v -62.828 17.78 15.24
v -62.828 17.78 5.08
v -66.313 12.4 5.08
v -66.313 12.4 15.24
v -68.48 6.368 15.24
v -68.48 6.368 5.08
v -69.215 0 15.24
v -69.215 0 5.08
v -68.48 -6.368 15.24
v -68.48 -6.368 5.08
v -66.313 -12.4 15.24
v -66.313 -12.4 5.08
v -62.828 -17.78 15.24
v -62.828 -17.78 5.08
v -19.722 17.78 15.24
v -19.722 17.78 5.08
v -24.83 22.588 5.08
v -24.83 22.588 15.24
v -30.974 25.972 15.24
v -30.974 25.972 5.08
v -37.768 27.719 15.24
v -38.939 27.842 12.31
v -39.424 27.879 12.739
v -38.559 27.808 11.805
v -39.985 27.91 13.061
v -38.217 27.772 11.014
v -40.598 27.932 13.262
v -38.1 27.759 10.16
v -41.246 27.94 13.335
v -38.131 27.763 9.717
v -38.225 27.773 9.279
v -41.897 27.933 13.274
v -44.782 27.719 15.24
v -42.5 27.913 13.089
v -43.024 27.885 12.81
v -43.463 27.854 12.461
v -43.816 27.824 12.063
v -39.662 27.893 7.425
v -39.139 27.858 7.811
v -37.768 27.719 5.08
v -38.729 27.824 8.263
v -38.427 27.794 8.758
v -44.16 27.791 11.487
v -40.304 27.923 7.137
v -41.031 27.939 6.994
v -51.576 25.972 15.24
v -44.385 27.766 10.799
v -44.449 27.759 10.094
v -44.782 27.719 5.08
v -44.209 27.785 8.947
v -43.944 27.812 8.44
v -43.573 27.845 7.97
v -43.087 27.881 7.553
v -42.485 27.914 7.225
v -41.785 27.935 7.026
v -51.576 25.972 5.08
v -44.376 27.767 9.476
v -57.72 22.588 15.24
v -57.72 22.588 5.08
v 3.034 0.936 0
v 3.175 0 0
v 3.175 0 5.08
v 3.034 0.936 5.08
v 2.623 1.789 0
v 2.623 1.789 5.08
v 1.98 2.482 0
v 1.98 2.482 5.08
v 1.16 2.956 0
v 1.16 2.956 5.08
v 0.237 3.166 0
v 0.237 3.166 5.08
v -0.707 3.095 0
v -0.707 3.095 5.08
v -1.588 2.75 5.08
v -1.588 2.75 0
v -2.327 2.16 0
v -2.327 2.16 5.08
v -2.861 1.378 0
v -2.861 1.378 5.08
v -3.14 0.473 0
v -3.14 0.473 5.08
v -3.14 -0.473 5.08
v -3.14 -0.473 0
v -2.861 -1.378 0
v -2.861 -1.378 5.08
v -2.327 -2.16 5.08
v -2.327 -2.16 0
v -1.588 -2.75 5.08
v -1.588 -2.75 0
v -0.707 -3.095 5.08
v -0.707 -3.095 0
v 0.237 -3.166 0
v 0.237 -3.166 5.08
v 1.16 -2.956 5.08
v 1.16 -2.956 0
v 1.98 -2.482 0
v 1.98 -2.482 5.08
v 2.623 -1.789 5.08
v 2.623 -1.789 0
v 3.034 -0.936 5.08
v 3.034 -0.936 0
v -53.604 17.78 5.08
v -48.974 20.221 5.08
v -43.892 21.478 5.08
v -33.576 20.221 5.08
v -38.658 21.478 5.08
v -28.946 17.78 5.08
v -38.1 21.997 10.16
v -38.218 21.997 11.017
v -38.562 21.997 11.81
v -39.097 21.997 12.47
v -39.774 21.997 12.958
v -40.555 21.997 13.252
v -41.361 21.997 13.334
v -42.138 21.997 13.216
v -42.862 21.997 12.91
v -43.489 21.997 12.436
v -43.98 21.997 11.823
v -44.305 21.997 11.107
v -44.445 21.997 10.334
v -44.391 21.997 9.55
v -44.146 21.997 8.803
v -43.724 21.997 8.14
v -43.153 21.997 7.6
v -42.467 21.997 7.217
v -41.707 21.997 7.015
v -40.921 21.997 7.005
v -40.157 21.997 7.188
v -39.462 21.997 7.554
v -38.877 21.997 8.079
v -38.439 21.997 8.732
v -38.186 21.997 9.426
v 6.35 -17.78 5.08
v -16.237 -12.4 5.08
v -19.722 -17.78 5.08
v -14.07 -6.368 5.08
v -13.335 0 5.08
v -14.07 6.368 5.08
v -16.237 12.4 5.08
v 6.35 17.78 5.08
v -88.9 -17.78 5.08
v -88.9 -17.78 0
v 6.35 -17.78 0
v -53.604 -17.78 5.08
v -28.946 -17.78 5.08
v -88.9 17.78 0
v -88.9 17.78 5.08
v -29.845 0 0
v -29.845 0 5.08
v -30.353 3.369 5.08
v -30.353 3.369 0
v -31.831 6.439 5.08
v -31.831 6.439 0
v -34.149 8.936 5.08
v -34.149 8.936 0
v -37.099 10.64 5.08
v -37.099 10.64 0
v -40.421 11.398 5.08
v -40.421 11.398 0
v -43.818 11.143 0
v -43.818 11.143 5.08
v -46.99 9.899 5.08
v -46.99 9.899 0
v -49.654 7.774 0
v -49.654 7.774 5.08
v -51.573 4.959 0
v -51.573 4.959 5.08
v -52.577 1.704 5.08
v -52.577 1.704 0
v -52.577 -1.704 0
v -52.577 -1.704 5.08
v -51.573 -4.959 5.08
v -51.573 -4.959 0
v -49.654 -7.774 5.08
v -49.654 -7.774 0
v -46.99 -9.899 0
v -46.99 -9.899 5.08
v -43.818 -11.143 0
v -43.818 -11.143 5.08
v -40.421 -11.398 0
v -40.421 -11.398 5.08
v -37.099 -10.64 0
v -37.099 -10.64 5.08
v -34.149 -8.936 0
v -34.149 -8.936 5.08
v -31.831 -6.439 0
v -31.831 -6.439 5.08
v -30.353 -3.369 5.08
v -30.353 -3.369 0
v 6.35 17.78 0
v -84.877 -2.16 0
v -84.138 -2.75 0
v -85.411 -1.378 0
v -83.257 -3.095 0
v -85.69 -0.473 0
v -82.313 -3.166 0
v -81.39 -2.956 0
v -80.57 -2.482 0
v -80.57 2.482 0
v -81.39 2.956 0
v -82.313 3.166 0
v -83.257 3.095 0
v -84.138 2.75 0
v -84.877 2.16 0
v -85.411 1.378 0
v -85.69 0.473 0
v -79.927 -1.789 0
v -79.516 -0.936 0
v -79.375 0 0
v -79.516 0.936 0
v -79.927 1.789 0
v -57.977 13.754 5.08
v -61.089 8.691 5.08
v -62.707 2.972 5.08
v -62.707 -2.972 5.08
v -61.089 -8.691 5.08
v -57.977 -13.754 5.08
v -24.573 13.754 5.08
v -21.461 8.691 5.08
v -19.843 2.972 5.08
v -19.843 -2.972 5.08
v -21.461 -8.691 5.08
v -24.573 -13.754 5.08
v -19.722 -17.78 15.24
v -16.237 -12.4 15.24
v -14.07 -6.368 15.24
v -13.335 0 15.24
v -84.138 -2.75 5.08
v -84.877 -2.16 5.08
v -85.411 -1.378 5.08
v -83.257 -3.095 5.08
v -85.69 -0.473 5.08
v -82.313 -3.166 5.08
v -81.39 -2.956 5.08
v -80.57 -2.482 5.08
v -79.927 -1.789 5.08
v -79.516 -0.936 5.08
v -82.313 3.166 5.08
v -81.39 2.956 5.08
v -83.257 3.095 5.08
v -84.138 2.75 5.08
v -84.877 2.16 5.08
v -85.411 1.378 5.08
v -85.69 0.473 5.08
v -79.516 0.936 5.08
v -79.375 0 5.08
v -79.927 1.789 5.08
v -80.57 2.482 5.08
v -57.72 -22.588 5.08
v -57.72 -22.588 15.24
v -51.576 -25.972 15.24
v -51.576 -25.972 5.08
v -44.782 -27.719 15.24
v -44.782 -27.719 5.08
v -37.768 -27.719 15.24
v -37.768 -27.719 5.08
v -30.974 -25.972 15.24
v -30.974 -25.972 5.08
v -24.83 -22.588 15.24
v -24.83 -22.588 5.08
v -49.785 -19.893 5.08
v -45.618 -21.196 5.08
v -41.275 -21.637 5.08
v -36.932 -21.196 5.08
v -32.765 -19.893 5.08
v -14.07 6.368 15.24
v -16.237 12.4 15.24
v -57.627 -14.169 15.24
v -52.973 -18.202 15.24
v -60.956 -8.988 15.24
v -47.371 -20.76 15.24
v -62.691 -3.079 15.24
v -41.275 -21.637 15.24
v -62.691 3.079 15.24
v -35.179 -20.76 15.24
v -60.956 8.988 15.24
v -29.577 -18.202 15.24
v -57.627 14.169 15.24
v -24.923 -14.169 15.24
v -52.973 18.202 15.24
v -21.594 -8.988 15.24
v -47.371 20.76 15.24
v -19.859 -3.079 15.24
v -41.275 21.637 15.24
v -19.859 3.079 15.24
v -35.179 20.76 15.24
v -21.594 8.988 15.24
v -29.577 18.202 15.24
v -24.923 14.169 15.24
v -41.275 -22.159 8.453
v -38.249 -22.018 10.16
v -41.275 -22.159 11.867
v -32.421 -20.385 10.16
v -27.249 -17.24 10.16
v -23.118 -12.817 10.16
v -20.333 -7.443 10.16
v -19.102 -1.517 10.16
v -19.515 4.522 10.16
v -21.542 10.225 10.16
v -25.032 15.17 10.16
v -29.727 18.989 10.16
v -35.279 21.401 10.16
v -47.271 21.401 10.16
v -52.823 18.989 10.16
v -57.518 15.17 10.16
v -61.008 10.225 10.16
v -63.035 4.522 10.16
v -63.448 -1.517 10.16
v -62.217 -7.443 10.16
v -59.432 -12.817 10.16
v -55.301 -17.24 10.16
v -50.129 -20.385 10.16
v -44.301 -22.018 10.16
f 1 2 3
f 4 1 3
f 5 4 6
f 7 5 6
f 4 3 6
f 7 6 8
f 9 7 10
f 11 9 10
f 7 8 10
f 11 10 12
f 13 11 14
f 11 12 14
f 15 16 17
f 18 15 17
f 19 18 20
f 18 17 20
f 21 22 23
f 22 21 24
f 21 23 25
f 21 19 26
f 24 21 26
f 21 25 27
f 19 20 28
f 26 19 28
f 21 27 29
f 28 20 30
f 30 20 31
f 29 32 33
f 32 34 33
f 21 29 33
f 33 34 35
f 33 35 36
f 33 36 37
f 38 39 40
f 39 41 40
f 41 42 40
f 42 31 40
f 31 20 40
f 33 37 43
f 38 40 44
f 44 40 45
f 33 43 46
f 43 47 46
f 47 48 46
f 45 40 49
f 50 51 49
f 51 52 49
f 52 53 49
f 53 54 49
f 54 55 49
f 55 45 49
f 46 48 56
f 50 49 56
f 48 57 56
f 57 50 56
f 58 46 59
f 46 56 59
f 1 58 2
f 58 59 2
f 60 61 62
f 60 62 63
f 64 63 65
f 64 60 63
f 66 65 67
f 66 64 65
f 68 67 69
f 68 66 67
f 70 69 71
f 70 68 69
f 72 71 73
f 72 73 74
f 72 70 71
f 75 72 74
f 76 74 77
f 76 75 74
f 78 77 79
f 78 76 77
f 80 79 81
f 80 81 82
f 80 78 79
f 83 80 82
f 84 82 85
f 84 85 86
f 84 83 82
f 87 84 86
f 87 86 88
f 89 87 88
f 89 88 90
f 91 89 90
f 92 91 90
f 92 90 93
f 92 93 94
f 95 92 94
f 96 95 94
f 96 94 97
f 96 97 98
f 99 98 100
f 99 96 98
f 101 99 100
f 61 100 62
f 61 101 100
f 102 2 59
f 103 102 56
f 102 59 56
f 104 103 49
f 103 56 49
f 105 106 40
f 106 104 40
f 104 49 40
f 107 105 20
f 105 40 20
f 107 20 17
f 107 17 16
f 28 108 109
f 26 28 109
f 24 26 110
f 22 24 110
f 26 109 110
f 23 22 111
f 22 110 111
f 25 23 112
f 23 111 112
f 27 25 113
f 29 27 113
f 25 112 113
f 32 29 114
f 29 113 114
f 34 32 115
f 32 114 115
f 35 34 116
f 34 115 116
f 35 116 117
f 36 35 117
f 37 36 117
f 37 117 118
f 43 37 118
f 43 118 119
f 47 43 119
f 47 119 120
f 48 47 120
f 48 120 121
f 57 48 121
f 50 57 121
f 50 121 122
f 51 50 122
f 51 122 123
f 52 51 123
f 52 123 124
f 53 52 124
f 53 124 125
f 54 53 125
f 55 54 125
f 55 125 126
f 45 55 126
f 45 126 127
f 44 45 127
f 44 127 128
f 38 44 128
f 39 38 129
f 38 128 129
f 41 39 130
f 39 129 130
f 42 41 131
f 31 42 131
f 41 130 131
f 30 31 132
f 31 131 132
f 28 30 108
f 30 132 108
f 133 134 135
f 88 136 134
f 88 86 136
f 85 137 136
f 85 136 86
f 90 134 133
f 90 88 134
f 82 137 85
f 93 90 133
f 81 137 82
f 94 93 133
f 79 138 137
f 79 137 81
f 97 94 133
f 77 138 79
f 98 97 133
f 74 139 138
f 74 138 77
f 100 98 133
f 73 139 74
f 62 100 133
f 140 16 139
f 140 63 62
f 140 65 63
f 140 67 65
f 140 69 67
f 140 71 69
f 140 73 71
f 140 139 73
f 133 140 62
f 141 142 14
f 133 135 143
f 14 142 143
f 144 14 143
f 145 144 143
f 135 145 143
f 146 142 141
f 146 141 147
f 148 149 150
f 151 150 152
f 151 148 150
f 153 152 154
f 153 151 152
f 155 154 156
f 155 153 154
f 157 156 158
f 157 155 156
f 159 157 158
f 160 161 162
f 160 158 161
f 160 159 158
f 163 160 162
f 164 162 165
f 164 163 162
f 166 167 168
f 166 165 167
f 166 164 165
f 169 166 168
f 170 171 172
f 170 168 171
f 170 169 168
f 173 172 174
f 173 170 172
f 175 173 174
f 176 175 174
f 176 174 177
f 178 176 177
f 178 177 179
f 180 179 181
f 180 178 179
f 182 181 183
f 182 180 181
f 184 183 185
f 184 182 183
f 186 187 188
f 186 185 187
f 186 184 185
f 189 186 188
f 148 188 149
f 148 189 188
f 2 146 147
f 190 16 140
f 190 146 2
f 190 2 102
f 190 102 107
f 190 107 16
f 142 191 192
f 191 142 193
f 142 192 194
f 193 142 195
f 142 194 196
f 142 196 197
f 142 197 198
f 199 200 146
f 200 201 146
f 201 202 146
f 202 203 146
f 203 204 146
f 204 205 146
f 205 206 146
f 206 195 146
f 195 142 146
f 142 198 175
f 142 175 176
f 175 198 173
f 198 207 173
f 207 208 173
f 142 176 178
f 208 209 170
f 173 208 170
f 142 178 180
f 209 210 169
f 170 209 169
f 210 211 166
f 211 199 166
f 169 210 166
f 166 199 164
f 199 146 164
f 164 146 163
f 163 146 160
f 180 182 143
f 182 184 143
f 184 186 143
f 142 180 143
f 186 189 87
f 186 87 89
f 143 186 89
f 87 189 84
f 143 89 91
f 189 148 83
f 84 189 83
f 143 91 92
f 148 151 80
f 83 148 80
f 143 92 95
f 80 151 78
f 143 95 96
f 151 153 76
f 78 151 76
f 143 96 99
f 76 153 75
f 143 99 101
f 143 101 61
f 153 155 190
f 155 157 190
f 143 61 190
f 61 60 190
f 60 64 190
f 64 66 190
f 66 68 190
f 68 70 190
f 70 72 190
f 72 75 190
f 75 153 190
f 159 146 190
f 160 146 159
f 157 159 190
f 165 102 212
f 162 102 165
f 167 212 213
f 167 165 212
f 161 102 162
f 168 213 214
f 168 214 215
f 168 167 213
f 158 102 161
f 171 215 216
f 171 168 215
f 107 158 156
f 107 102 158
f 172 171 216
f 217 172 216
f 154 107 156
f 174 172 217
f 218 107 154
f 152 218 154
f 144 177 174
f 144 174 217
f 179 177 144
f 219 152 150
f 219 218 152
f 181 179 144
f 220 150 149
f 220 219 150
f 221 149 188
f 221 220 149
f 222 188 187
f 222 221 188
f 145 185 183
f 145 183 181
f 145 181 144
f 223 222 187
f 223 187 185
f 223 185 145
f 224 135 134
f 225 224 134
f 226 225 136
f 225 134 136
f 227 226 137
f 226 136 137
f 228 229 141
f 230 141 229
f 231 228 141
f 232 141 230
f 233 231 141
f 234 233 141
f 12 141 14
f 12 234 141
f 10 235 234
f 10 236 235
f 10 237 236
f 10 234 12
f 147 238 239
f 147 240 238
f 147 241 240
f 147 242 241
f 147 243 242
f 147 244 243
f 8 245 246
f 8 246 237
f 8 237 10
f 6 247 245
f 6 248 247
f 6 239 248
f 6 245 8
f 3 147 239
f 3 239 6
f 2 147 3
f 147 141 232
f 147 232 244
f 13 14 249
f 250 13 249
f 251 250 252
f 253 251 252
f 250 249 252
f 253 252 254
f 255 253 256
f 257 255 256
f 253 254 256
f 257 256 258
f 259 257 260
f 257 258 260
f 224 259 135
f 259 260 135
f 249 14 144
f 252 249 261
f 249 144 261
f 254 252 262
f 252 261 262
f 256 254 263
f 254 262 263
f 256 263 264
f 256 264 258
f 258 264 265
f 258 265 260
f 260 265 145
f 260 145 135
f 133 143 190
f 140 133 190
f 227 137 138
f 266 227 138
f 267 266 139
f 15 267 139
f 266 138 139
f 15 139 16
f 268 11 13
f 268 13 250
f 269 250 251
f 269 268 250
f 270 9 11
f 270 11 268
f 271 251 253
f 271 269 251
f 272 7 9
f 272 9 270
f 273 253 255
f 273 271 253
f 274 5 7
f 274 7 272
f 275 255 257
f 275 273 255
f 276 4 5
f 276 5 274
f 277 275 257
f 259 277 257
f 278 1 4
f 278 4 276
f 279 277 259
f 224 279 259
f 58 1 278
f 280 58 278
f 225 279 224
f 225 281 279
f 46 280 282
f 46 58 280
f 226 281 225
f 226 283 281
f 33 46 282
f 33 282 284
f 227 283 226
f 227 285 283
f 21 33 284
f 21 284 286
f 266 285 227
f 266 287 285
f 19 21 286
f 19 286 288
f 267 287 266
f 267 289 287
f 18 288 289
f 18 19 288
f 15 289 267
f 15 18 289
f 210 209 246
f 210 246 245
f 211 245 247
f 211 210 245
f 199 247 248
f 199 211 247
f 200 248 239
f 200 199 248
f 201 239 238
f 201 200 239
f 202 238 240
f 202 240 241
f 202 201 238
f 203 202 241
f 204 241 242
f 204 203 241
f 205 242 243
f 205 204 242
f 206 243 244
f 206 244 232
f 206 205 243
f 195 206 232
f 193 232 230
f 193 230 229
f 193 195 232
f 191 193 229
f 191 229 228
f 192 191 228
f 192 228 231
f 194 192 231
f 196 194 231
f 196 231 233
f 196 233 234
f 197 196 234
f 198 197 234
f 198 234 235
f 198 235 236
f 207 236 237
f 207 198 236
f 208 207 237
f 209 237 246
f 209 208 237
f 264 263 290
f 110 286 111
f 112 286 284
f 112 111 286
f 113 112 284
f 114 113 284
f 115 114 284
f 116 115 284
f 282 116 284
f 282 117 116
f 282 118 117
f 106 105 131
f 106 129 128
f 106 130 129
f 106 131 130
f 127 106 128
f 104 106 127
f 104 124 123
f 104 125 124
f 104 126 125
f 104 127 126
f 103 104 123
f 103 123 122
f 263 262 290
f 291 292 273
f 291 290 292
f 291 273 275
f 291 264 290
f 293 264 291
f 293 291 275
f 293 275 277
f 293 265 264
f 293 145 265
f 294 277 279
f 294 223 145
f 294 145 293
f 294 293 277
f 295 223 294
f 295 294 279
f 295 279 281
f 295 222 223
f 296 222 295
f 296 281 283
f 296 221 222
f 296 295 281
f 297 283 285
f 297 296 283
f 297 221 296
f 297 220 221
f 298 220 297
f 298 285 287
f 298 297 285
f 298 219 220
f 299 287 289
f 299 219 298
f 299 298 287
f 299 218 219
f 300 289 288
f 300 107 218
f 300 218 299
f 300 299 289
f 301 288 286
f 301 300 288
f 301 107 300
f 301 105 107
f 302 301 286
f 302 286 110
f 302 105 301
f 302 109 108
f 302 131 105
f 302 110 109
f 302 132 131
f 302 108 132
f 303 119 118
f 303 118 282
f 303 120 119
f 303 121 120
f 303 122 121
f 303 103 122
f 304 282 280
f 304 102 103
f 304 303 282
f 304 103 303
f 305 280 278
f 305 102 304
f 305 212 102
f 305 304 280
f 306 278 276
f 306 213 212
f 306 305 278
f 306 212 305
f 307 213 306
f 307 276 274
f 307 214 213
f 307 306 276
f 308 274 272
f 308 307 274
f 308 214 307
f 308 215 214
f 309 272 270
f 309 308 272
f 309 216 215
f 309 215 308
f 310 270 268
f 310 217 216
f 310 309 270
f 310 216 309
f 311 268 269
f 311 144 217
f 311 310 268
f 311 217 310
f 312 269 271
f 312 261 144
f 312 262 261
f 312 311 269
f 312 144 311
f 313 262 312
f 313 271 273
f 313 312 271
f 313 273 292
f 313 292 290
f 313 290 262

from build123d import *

# Parameters (mm, degrees)
F0_W     = 95.25
F0_H     = 35.56
F0_R     = 3.175
F0_R_2   = 11.43
F1_DEPTH = 5.08
F2_R     = 11.43
F3_DEPTH = 10.16
F8_D     = 6.35
F8_DEPTH = 27.941


with BuildPart() as f1:
    # F0 (on Top) → F1 (new body)
    with BuildSketch(Plane.XY):
        with Locations((-41.275, 0)):
            Rectangle(F0_W, F0_H)
        with Locations((-82.55, 0)):
            Circle(F0_R, mode=Mode.SUBTRACT)
        with Locations((-41.275, 0)):
            Circle(F0_R_2, mode=Mode.SUBTRACT)
        Circle(F0_R, mode=Mode.SUBTRACT)
    extrude(amount=F1_DEPTH)

    # F2 (on face) → F3 (join)
    with BuildSketch(Plane.XY.offset(5.08)):
        with BuildLine():
            ThreePointArc((-19.7223853094, -17.78), (-14.9802889876, -9.4462570774), (-13.335, 0))
            ThreePointArc((-13.335, 0), (-14.9802889876, 9.4462570774), (-19.7223853094, 17.78))
            Line((-19.7223853094, 17.78), (-62.8276146906, 17.78))
            ThreePointArc((-62.8276146906, 17.78), (-69.215, 0), (-62.8276146906, -17.78))
            Line((-62.8276146906, -17.78), (-19.7223853094, -17.78))
        make_face()
        with Locations((-41.275, 0)):
            Circle(F2_R, mode=Mode.SUBTRACT)
        with BuildLine():
            Line((-62.8276146906, 17.78), (-19.7223853094, 17.78))
            ThreePointArc((-19.7223853094, 17.78), (-41.275, 27.94), (-62.8276146906, 17.78))
        make_face()
        with BuildLine():
            ThreePointArc((-62.8276146906, -17.78), (-41.275, -27.94), (-19.7223853094, -17.78))
            Line((-19.7223853094, -17.78), (-62.8276146906, -17.78))
        make_face()
    extrude(amount=F3_DEPTH)

    # F5 (on offset) → F6 (revolve, cut)
    with BuildSketch(Plane.YZ.offset(-41.275)):
        Polygon((0, 5.08), (0, 10.16), (-21.6366407975, 5.08), align=None)
        with BuildLine():
            Line((-21.6366407975, 5.08), (0, 10.16))
            Line((0, 10.16), (0, 32.385))
            ThreePointArc((0, 32.385), (-17.4191507399, 23.9630363507), (-21.6366407975, 5.08))
        make_face()
    revolve(axis=Axis((-41.275, 0, 21.2725), (0, 0, 1)), mode=Mode.SUBTRACT)

    # F8 (through all, one way)
    with BuildSketch(Plane.XZ):
        with Locations((-41.275, 10.16)):
            Circle(F8_D / 2)
    extrude(amount=-F8_DEPTH, mode=Mode.SUBTRACT)


solid = f1.part
